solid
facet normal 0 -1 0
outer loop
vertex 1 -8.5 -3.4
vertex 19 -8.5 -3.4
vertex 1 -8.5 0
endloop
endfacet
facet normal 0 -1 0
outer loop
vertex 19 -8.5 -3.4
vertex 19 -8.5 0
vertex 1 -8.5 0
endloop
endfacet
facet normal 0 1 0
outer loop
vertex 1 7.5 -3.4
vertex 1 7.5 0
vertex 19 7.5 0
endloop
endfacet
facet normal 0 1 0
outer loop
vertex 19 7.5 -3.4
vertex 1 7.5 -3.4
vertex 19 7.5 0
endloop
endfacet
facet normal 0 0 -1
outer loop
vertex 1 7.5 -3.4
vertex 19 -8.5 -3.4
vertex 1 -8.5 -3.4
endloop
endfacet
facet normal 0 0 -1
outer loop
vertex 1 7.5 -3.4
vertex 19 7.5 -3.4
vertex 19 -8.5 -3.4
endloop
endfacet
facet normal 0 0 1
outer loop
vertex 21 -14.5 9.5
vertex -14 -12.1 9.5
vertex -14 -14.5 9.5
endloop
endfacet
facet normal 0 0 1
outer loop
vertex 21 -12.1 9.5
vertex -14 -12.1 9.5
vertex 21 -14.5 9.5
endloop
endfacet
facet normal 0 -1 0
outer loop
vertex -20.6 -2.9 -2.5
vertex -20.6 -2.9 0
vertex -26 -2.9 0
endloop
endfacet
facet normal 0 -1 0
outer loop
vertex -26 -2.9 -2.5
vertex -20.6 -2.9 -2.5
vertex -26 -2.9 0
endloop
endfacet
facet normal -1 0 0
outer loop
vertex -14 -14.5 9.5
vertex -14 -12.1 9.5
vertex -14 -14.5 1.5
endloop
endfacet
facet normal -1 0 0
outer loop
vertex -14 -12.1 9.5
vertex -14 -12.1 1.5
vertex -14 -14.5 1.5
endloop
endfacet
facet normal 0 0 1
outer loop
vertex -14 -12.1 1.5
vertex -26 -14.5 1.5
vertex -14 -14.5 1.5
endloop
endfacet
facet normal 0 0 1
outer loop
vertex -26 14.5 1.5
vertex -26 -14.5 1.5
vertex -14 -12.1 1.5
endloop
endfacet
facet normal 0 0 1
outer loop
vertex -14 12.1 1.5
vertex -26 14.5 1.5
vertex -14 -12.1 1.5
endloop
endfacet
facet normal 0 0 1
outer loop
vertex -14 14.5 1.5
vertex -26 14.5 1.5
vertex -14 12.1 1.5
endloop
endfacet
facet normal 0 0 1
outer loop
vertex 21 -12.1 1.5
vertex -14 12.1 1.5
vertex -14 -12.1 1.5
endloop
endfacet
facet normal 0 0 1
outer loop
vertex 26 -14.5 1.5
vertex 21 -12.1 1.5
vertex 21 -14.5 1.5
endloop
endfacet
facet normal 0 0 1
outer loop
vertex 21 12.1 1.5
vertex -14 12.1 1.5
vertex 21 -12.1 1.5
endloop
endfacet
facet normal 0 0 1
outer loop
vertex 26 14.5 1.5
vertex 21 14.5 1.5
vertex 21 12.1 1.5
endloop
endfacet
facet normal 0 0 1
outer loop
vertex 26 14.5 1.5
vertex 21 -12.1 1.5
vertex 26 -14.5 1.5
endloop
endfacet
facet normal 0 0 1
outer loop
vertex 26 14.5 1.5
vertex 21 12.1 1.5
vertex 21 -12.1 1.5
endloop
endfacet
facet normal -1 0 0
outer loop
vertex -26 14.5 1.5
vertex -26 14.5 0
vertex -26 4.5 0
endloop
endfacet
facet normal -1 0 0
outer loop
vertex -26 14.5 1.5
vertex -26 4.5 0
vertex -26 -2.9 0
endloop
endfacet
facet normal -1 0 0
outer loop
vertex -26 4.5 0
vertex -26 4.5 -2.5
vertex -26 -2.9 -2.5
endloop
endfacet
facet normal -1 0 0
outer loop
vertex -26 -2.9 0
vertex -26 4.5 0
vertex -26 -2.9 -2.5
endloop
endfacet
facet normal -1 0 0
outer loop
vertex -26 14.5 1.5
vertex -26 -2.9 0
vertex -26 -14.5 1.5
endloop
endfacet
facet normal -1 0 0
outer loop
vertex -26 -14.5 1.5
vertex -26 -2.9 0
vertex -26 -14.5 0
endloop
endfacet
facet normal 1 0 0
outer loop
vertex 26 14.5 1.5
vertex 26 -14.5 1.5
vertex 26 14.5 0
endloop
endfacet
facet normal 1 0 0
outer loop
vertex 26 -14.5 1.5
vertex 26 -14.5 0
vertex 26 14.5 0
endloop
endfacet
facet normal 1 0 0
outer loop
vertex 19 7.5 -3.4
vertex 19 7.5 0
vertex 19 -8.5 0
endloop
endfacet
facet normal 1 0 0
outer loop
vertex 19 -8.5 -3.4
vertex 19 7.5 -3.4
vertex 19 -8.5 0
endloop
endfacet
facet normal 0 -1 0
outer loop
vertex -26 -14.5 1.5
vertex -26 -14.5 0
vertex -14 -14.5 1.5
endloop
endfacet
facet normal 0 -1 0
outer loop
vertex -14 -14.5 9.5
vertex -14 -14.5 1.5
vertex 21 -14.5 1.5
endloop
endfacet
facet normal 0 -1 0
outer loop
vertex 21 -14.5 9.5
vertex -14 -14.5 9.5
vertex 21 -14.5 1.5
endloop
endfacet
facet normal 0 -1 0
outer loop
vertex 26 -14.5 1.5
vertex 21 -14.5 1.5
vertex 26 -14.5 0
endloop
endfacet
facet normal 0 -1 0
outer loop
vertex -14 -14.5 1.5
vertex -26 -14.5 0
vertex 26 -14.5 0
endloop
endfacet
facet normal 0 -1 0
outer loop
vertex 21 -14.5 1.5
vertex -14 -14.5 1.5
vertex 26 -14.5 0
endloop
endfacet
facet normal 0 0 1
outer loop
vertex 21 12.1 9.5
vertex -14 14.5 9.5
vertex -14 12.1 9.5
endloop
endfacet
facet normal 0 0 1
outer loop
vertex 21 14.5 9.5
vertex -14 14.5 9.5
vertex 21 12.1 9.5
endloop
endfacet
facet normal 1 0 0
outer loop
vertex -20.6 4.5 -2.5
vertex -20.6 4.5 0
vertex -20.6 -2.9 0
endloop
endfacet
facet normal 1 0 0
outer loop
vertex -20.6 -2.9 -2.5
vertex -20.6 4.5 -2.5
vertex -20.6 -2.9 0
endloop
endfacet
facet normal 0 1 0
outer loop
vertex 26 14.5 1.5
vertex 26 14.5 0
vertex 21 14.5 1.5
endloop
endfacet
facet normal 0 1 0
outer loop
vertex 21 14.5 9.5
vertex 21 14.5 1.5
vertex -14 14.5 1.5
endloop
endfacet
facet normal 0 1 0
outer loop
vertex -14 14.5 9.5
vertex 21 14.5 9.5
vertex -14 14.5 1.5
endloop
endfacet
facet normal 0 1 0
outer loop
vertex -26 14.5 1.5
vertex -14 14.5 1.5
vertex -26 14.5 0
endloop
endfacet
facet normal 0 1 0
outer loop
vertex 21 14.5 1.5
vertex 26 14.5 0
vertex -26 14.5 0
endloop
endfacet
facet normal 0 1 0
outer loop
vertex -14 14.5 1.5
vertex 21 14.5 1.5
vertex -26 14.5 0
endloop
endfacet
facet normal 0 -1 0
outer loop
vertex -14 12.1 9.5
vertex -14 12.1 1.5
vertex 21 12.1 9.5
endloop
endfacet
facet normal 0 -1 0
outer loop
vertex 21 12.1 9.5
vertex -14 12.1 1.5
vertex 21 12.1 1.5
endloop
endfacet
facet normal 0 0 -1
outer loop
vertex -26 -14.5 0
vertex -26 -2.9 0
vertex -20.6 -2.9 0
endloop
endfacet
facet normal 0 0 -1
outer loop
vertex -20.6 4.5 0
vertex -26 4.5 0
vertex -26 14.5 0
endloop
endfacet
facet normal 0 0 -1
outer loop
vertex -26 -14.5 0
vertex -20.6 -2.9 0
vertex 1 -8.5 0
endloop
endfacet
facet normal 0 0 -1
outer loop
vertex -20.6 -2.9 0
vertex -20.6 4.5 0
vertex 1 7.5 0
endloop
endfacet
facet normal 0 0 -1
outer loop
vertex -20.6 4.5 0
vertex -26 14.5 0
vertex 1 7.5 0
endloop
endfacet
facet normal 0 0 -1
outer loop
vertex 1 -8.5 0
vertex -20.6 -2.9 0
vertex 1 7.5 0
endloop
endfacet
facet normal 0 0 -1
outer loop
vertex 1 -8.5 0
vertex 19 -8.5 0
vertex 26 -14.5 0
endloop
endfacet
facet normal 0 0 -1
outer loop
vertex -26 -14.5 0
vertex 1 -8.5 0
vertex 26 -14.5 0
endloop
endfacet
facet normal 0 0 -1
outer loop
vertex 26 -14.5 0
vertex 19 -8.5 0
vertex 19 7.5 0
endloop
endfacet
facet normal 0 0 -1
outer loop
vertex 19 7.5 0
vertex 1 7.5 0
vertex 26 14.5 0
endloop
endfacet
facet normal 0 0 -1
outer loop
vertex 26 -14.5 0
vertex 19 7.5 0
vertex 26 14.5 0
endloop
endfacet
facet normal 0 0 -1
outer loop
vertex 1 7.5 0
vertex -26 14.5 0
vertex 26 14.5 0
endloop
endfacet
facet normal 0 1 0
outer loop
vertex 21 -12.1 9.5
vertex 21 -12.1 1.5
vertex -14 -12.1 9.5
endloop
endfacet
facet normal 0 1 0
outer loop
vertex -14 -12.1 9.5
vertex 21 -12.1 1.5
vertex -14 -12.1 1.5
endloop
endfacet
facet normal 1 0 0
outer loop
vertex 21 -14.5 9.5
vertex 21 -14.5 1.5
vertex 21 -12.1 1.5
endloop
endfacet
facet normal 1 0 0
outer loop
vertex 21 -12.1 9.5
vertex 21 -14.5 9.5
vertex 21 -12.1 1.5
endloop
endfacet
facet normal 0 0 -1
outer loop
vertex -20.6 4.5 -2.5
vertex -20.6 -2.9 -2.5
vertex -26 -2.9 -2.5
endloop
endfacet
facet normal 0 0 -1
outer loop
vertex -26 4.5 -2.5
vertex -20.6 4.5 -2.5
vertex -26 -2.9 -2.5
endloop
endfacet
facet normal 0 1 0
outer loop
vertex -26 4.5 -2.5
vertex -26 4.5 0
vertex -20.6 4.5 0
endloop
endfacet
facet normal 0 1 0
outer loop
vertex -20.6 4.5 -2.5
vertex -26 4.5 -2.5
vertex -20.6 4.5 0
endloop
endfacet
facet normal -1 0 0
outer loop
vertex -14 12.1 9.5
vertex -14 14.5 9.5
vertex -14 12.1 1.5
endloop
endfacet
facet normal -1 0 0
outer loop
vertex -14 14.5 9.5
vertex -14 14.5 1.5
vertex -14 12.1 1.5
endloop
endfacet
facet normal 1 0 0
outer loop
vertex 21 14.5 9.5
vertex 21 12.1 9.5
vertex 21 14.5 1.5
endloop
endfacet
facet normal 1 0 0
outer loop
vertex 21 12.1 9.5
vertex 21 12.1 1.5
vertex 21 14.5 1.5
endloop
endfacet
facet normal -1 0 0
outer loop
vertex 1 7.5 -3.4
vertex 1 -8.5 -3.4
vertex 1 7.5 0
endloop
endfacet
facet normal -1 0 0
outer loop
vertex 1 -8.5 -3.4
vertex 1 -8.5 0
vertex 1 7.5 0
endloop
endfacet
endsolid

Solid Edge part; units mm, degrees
sketch "Sketch1" plane through (0, 0, 0) normal (0, 0, 1) x (1, 0, 0)
  line L0 (26, -14.5) -> (26, 14.5)
  line L1 (26, 14.5) -> (-26, 14.5)
  line L2 (-26, 14.5) -> (-26, -14.5)
  line L3 (-26, -14.5) -> (26, -14.5)
extrude "Protrusion1" add sketch "Sketch1" along normal blind 1.5
sketch "Sketch2" plane through (0, 0, 1.5) normal (0, 0, 1) x (1, 0, 0)
  line L0 (-14, 12.1) -> (21, 12.1)
  line L1 (21, 12.1) -> (21, 14.5)
  line L2 (21, 14.5) -> (-14, 14.5)
  line L3 (-14, 14.5) -> (-14, 12.1)
  line L4 (21, -14.5) -> (21, -12.1)
  line L5 (21, -12.1) -> (-14, -12.1)
  line L6 (-14, -12.1) -> (-14, -14.5)
  line L7 (-14, -14.5) -> (21, -14.5)
  dimension "D1" = 35
  dimension "D2" = 5
  dimension "D3" = 35
  dimension "D4" = 5
  dimension "D5" = 2.4
extrude "ExtrudedProtrusion_2" add sketch "Sketch2" along normal blind 8
sketch "Sketch3" plane through (0, 0, 0) normal (0, 0, -1) x (-1, 0, 0)
  line L0 (-19, -8.5) -> (-1, -8.5)
  line L1 (-1, -8.5) -> (-1, 7.5)
  line L2 (-1, 7.5) -> (-19, 7.5)
  line L3 (-19, 7.5) -> (-19, -8.5)
extrude "ExtrudedProtrusion_3" add sketch "Sketch3" along normal blind 3.4
sketch "Sketch4" plane through (0, 0, 0) normal (0, 0, -1) x (-1, 0, 0)
  line L0 (26, 4.5) -> (20.6, 4.5)
  line L1 (20.6, 4.5) -> (20.6, -2.9)
  line L2 (20.6, -2.9) -> (26, -2.9)
  line L3 (26, -2.9) -> (26, 4.5)
extrude "ExtrudedProtrusion_4" add sketch "Sketch4" along normal blind 2.5
properties material "ABS Plastic, high impact"
